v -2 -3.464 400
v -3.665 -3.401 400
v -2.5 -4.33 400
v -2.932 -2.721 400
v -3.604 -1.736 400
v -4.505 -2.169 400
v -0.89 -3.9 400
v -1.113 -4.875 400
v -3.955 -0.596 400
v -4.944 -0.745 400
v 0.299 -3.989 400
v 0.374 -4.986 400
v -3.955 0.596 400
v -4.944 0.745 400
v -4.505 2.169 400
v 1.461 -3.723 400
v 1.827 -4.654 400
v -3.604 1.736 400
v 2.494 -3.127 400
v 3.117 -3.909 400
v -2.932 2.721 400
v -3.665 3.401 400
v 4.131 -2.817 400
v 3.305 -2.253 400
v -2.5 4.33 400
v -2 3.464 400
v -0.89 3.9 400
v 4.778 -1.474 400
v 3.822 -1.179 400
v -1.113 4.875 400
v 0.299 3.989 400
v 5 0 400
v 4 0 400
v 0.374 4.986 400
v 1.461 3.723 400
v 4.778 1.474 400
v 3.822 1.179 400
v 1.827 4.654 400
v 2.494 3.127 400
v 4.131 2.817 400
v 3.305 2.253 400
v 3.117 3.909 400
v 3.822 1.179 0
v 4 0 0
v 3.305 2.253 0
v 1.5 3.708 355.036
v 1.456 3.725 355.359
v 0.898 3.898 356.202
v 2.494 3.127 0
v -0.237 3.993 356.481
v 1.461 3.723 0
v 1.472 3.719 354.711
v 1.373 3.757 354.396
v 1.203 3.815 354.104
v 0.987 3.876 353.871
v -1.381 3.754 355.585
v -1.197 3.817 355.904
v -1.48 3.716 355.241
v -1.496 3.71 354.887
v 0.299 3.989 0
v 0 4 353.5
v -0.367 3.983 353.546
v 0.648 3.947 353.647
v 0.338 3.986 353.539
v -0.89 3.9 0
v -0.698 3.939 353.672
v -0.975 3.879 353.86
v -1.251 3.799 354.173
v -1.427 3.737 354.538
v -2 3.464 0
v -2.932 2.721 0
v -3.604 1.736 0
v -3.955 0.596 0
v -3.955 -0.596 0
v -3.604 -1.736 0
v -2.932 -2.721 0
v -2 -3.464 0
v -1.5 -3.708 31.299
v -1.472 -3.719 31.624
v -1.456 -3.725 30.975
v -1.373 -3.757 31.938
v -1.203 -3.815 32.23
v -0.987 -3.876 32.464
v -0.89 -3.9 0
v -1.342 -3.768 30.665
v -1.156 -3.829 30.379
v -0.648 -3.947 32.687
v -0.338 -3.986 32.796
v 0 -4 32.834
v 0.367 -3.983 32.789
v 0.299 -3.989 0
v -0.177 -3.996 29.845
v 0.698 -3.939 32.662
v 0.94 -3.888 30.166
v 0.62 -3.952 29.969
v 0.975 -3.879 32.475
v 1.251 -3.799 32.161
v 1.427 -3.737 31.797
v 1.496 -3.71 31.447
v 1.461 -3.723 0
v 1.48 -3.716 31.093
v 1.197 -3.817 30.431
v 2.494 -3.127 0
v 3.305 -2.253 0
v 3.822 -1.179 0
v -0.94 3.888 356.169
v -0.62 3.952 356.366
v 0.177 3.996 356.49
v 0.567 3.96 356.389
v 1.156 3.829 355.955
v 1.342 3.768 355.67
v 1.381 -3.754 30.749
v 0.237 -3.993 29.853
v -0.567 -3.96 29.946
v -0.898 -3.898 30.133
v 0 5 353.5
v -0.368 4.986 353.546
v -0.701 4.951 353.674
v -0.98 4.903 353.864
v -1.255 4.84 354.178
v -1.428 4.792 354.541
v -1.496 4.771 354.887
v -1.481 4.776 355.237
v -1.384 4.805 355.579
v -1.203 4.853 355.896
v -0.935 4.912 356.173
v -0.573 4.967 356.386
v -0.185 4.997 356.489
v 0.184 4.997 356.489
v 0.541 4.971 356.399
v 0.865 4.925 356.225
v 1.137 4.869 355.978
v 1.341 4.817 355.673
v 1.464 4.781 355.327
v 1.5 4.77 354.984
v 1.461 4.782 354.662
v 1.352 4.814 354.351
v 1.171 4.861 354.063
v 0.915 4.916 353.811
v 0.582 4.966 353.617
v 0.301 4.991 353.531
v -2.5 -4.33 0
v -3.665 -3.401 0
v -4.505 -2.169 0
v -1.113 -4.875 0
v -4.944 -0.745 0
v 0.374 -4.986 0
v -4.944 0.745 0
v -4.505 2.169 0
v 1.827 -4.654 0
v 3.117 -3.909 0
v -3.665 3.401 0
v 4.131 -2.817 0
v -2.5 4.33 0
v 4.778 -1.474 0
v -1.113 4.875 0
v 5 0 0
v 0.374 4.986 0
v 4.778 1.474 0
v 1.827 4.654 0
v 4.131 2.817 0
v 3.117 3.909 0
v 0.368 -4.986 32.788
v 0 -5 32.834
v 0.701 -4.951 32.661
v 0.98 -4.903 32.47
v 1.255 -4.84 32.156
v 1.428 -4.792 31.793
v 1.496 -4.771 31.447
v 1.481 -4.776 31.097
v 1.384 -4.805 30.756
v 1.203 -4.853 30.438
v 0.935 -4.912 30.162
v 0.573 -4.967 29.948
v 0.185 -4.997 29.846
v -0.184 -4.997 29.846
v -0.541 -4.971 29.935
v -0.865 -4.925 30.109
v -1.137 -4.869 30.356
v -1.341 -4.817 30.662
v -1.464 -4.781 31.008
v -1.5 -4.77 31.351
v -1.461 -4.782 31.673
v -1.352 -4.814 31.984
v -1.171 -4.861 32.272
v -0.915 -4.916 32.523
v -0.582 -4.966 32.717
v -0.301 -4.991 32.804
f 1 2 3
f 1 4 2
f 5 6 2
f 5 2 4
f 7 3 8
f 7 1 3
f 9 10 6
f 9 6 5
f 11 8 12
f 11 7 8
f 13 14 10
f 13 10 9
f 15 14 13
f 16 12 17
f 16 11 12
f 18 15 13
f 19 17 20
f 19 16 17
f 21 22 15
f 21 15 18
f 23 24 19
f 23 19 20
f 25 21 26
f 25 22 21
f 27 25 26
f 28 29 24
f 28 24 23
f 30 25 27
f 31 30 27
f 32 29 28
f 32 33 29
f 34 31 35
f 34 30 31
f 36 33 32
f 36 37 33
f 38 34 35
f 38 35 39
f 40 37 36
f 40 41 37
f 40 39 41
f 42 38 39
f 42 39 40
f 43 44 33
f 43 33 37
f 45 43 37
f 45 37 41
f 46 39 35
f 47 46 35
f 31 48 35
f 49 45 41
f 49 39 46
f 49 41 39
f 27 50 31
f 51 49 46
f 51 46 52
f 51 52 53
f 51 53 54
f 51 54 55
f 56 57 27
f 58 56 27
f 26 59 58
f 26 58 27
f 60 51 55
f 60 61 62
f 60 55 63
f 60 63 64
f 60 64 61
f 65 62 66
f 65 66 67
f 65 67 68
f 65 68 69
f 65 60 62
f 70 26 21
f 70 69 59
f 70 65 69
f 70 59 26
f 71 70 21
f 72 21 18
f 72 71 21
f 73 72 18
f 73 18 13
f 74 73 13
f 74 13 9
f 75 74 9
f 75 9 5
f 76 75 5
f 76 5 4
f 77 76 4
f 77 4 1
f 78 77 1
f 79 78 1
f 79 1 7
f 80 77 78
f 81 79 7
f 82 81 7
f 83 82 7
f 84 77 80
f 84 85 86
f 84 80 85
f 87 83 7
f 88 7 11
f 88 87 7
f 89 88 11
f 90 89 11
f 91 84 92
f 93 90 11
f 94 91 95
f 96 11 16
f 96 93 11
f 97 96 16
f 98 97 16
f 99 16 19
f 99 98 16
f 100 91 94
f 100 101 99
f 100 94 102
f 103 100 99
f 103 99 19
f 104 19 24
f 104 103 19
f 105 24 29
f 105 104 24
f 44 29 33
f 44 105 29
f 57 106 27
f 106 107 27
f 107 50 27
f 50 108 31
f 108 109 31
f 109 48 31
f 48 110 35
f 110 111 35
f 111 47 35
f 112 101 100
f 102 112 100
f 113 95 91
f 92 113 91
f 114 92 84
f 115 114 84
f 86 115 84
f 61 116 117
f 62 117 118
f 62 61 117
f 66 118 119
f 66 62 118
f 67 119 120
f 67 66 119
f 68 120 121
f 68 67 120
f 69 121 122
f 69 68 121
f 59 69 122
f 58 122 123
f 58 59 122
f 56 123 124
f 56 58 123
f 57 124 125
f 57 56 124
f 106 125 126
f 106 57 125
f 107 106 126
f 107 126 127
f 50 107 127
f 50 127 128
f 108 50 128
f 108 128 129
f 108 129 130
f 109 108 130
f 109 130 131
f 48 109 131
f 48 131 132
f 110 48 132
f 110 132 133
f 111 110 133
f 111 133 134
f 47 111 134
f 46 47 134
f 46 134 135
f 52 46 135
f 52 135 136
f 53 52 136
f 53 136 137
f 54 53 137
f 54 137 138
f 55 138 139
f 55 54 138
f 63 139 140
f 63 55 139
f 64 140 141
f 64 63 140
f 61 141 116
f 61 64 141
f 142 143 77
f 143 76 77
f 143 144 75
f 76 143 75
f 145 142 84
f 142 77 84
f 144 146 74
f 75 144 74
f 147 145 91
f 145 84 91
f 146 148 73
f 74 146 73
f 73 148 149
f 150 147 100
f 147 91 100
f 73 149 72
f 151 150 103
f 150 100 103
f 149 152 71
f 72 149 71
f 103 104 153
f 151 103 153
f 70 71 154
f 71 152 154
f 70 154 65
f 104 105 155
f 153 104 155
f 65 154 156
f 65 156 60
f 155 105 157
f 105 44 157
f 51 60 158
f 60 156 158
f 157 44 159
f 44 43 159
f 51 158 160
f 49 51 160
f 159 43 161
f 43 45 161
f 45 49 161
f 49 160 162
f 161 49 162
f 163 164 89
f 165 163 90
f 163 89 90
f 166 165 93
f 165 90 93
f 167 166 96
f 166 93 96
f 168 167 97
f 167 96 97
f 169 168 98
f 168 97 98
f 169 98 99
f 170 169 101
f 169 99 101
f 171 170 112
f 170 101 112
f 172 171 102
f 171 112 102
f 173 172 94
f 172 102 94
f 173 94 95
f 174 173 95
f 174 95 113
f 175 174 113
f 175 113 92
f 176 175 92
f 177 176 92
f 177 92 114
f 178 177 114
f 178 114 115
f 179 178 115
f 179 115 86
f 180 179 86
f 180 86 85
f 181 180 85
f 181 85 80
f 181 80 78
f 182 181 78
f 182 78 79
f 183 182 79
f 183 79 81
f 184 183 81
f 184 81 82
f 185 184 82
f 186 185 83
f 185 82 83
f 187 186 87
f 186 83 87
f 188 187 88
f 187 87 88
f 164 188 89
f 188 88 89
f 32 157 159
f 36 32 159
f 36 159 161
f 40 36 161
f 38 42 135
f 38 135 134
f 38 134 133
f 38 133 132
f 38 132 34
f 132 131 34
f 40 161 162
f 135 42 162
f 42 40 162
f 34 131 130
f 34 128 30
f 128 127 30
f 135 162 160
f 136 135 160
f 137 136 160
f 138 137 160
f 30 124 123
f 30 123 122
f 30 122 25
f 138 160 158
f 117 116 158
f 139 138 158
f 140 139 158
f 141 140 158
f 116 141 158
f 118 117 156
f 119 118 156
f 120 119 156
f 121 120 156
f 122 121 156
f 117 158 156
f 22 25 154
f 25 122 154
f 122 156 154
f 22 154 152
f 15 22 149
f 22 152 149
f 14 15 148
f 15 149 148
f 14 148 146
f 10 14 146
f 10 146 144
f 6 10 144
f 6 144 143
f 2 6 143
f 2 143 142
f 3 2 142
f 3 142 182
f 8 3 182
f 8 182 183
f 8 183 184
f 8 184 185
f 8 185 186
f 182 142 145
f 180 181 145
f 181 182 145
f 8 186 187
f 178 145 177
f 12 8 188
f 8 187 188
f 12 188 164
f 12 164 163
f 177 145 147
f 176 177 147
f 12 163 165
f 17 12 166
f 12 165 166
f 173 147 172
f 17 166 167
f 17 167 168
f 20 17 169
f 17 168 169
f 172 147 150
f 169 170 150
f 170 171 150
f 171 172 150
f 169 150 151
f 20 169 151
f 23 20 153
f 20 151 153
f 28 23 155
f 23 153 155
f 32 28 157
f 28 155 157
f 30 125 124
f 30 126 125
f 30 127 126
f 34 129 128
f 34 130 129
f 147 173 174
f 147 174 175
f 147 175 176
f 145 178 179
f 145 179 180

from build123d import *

# Parameters (mm, degrees)
SKETCH_1_R          = 5
SKETCH_1_R_2        = 4
EXTRUDE_1_DEPTH     = 400
SKETCH_2_R          = 1.5
CUT_EXTRUDE_1_DEPTH = 401.062495118
SKETCH_3_R          = 1.5
CUT_EXTRUDE_2_DEPTH = 401.06249522


with BuildPart() as part:
    # 草图1 → 凸台-拉伸1 (new body)
    with BuildSketch(Plane.XY):
        Circle(SKETCH_1_R)
        Circle(SKETCH_1_R_2, mode=Mode.SUBTRACT)
    extrude(amount=EXTRUDE_1_DEPTH)

    # 草图2 → 切除-拉伸1 (cut, through all)
    with BuildSketch(Plane(origin=(0, 0, 0), x_dir=(1, 0, 0), z_dir=(0, 1, 0))):
        with Locations(Location((0, -31.334408431, 0), (0, 0, 270))):
            Circle(SKETCH_2_R)
    extrude(amount=-CUT_EXTRUDE_1_DEPTH, mode=Mode.SUBTRACT)

    # 草图3 → 切除-拉伸2 (cut, through all)
    with BuildSketch(Plane(origin=(0, 0, 0), x_dir=(1, 0, 0), z_dir=(0, 1, 0))):
        with Locations(Location((0, -355, 0), (0, 0, 90))):
            Circle(SKETCH_3_R)
    extrude(amount=CUT_EXTRUDE_2_DEPTH, mode=Mode.SUBTRACT)


solid = part.part
